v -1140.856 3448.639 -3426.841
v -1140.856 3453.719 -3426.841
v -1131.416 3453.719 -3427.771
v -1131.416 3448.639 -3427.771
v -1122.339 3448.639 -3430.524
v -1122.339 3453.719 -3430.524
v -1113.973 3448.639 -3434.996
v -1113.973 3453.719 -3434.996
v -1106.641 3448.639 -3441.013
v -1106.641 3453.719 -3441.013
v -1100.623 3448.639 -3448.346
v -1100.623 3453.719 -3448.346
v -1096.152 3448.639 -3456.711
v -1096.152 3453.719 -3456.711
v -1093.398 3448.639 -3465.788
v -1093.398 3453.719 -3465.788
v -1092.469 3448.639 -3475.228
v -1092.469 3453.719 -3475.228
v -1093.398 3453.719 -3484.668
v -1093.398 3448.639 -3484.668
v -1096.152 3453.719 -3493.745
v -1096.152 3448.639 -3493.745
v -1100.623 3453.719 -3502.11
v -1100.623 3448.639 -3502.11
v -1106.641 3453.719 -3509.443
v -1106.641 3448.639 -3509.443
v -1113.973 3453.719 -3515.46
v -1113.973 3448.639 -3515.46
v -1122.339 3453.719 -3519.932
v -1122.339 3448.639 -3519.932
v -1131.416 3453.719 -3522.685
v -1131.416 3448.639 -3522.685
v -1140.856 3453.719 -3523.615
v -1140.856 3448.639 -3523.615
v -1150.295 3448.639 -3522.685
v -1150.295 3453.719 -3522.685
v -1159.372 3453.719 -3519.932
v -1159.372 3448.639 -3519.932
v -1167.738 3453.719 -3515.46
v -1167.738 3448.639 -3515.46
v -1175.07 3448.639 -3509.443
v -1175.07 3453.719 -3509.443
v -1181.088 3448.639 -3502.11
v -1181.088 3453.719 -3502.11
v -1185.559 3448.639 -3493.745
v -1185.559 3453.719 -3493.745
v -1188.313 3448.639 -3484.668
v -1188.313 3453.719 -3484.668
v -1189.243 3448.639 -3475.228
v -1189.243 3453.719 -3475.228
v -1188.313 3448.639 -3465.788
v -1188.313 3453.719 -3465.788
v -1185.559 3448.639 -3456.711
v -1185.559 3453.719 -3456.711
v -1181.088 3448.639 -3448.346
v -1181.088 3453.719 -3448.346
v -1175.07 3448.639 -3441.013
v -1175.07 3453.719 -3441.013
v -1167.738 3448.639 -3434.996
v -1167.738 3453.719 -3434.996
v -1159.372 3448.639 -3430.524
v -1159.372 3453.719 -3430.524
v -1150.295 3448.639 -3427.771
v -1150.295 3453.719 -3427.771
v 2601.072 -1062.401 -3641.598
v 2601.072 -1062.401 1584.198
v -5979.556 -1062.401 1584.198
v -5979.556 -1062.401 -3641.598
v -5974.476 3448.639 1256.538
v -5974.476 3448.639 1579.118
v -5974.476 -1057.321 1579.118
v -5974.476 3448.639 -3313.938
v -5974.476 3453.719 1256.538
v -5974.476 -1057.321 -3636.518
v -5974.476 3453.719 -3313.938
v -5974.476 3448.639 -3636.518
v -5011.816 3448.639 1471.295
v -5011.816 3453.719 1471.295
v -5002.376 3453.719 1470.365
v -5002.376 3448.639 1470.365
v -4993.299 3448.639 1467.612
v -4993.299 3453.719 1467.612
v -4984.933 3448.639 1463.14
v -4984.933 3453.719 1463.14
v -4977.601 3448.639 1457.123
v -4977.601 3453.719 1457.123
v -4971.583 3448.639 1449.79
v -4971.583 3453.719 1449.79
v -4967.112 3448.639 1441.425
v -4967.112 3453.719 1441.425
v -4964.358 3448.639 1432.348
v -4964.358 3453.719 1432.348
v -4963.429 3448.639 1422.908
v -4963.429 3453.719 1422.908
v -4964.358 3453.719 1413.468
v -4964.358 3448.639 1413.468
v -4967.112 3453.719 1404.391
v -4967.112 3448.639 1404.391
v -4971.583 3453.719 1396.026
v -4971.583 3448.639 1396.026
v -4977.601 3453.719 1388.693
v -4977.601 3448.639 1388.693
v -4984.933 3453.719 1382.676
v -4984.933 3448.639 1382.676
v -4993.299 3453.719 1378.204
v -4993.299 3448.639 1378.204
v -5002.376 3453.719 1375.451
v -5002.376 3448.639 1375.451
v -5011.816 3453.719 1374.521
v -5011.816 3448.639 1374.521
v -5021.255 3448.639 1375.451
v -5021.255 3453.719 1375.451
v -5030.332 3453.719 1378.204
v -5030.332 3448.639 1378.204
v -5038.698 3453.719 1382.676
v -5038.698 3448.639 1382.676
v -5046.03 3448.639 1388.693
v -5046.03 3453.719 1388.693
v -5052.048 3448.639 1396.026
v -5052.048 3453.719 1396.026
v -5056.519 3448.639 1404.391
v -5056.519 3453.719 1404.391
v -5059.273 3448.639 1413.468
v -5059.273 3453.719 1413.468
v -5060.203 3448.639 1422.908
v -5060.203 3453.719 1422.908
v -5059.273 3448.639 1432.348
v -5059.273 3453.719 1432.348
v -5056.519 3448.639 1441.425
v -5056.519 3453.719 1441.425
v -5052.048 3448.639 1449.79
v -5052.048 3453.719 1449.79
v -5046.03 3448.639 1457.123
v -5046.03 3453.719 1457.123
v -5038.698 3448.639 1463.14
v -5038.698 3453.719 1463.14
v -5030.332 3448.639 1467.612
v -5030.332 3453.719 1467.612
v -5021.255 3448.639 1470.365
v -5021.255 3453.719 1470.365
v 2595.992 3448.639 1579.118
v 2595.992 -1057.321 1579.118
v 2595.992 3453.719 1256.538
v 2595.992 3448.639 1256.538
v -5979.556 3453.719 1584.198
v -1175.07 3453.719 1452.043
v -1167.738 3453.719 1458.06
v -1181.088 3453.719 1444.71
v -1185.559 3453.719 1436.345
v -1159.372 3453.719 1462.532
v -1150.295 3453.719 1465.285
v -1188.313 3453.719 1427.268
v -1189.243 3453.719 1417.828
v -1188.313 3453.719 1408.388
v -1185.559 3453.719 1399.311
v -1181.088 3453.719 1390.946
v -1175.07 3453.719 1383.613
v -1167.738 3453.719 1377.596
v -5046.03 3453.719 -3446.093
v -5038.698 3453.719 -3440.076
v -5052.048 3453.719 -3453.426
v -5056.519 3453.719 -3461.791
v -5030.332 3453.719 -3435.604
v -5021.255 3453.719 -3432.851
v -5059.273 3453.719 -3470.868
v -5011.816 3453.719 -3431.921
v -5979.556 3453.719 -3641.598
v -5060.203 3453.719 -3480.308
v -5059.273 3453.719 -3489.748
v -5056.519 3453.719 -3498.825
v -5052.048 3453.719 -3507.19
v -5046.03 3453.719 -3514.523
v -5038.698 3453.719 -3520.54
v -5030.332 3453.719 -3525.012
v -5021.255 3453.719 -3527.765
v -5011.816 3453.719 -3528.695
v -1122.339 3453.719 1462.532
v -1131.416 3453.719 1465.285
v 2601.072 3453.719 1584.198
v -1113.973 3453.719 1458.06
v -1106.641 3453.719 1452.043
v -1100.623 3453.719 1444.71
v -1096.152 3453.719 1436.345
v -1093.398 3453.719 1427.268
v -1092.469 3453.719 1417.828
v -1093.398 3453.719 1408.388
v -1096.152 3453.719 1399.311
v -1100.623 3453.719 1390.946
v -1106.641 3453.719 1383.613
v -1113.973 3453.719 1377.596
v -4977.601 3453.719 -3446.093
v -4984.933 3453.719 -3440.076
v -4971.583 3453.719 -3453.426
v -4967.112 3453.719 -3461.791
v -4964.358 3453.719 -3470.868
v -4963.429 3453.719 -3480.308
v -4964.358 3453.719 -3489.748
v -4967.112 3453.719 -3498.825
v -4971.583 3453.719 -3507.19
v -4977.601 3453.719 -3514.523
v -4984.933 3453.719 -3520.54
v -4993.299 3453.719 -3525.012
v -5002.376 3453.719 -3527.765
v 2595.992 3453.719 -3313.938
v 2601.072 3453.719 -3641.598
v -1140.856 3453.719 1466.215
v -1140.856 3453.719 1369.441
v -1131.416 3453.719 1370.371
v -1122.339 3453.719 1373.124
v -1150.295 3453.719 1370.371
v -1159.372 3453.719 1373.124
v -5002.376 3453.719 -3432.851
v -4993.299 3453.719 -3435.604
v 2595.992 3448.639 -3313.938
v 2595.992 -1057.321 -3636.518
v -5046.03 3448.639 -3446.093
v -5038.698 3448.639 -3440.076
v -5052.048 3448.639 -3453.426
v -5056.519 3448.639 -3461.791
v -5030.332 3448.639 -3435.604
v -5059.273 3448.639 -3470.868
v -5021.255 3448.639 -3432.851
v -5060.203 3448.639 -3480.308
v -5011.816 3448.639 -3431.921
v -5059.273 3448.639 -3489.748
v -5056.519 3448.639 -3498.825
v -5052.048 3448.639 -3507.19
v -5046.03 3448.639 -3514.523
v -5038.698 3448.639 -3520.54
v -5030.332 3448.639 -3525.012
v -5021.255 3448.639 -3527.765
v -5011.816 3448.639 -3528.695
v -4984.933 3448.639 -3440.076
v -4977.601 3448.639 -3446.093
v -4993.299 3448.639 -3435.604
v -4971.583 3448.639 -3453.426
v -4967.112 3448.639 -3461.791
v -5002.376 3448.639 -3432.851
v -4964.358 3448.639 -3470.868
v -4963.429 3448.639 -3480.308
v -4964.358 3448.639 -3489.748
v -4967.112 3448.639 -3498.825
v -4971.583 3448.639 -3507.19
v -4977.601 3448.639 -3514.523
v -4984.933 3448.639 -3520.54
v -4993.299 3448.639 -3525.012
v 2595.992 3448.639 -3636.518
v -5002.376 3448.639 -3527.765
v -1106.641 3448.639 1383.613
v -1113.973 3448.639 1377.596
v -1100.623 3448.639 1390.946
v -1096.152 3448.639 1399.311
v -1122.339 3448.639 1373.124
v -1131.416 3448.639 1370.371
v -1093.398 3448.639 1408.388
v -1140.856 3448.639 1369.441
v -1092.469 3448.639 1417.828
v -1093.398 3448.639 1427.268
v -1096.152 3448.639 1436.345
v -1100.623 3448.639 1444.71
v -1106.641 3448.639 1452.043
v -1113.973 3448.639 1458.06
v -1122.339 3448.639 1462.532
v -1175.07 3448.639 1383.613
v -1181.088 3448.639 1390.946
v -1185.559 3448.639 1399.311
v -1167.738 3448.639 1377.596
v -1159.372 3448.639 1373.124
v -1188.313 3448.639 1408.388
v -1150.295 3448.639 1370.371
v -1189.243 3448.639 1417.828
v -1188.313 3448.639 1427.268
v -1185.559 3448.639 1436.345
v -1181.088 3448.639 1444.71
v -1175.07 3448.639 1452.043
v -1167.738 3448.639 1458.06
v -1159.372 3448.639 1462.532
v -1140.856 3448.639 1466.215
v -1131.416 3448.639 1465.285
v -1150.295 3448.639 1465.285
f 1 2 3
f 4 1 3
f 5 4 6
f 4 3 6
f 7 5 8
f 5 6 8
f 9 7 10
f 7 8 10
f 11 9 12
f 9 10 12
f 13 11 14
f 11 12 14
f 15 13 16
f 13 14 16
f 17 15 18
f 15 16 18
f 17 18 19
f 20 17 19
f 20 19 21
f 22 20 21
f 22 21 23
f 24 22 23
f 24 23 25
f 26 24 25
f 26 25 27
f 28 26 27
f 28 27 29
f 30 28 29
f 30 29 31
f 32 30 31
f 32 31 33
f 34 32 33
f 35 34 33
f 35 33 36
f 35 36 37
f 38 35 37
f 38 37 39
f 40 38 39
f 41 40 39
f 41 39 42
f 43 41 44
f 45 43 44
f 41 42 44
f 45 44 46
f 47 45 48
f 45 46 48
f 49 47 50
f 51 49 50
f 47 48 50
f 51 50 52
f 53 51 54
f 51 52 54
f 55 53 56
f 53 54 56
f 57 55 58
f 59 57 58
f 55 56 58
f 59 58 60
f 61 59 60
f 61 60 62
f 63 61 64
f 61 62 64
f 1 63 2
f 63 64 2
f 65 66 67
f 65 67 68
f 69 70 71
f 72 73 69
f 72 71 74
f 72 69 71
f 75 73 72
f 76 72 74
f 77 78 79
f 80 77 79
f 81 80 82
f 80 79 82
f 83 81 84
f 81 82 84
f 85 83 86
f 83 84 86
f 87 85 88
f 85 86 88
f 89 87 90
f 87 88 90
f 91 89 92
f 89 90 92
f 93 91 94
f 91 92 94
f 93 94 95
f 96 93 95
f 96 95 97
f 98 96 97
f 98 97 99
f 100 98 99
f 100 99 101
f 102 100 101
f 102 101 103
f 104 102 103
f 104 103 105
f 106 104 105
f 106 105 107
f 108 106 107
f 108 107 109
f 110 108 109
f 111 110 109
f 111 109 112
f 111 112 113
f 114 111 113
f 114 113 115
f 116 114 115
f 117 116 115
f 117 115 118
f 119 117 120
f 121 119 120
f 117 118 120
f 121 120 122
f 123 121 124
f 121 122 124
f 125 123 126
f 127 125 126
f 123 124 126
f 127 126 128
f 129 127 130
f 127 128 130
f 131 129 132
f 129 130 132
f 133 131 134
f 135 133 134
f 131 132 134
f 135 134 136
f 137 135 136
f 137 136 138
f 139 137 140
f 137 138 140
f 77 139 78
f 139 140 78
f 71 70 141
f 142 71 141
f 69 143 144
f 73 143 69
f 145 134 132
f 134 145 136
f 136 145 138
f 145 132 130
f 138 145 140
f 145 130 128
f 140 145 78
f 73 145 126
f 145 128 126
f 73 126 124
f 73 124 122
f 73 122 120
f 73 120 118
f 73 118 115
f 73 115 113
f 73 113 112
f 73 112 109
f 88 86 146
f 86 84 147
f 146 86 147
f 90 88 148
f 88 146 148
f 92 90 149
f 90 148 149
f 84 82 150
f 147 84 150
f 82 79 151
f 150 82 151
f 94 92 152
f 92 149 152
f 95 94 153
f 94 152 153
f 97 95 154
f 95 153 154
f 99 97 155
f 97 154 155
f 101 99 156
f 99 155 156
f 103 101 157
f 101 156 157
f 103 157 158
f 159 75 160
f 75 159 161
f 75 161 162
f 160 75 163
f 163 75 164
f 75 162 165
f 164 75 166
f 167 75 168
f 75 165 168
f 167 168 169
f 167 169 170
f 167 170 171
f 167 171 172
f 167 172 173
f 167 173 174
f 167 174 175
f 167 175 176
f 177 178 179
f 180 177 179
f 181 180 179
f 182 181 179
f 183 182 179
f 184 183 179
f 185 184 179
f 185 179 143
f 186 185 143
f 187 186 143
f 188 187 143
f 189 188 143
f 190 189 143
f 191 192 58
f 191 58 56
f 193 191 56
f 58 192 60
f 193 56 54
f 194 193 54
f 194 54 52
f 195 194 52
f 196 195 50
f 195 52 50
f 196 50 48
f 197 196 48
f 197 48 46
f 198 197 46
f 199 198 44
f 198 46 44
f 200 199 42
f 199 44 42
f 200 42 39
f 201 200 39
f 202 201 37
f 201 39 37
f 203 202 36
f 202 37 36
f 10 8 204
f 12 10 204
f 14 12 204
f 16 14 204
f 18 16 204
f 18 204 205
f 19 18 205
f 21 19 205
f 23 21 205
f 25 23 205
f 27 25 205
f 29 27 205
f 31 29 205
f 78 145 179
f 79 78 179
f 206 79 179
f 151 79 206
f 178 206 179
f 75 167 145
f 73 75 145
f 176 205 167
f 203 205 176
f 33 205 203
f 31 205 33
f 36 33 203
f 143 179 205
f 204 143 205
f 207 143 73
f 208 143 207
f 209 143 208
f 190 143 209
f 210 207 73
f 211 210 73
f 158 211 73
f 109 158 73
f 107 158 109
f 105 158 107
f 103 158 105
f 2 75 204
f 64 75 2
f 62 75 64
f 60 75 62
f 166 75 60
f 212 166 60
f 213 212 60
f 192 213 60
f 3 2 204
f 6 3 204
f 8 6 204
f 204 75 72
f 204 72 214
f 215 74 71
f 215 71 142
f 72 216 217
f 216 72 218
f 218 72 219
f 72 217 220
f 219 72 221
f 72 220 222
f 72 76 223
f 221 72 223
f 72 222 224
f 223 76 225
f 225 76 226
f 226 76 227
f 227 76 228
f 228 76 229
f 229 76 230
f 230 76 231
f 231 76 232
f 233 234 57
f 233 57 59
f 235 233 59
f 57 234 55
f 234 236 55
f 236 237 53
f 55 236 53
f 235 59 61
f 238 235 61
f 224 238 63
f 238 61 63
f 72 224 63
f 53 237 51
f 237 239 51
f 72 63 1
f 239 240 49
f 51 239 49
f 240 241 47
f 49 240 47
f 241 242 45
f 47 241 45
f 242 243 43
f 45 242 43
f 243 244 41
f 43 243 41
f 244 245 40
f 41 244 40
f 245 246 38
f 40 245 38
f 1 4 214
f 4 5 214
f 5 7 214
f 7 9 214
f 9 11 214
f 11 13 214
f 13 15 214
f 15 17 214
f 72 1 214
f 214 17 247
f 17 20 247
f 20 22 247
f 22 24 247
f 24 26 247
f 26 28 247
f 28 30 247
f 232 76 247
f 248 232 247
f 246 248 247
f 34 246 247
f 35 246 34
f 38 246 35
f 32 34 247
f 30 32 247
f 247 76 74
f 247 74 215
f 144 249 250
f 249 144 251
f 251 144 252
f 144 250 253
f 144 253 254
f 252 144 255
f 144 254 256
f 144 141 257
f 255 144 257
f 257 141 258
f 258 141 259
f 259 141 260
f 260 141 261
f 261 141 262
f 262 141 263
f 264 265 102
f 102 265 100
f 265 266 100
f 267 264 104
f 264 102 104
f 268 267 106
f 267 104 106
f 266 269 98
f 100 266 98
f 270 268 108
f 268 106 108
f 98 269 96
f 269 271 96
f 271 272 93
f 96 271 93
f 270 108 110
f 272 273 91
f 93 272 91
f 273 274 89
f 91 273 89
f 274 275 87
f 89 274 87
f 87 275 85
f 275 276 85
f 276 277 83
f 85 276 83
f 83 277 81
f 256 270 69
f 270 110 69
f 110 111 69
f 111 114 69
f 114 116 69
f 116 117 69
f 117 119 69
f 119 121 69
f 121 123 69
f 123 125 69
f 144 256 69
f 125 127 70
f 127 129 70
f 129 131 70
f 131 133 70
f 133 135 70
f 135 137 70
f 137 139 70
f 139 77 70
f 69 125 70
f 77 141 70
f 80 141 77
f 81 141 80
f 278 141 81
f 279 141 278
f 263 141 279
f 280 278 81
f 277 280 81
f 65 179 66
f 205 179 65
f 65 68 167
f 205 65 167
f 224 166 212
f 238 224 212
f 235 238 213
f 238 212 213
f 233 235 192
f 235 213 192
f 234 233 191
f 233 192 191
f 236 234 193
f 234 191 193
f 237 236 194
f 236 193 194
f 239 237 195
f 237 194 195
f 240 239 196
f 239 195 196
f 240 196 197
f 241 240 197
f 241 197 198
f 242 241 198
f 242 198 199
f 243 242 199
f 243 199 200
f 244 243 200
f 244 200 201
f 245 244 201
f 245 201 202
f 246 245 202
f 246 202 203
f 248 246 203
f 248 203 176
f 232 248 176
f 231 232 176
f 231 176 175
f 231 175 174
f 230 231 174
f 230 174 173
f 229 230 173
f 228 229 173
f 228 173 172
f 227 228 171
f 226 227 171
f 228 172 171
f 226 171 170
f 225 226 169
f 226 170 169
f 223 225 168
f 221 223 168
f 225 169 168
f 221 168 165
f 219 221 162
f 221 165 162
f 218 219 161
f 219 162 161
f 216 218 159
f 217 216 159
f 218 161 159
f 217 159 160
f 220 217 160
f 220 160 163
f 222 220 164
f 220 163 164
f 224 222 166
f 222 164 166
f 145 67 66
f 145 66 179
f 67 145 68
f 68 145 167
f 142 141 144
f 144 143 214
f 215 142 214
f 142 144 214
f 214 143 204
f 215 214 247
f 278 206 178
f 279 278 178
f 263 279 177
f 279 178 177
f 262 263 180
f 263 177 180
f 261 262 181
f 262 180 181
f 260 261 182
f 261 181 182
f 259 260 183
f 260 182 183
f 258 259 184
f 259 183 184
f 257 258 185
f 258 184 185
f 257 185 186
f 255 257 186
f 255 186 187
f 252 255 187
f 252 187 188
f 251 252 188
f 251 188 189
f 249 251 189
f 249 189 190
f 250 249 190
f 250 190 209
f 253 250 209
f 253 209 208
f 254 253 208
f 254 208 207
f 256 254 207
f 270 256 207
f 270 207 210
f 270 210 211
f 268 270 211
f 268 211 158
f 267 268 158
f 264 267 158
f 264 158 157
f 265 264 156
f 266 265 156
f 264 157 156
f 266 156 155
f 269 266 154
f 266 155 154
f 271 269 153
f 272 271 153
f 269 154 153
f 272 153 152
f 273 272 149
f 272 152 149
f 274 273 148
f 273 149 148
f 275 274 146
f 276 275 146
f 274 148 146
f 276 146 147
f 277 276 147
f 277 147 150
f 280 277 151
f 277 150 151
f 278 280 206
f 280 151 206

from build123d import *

# Parameters (mm, degrees)
SKETCH1_W           = 2057.4
SKETCH1_H           = 1778
BOSS_EXTRUDE1_DEPTH = 3378.2
SKETCH2_W           = 3374.19999784
SKETCH2_H           = 2053.39999784
CUT_EXTRUDE1_DEPTH  = 1775.99999892
SKETCH3_W           = 3374.19999784
SKETCH3_H           = 2.00000108
BOSS_EXTRUDE2_DEPTH = 127
SKETCH4_W           = 3374.19999784
SKETCH4_H           = 2.00000108
BOSS_EXTRUDE3_DEPTH = 127
CUT_EXTRUDE2_REACH  = 4338.636
SKETCH5_R           = 19.05
SCALE1_SCALE        = 2.54


with BuildPart() as part:
    # Sketch1 → Boss-Extrude1 (new body)
    with BuildSketch(Plane(origin=(0, 0, 0), x_dir=(0, 0, -1), z_dir=(1, 0, 0))):
        with Locations((1028.7, 889)):
            Rectangle(SKETCH1_W, SKETCH1_H)
    extrude(amount=-BOSS_EXTRUDE1_DEPTH)

    # Sketch2 → Cut-Extrude1 (cut)
    with BuildSketch(Plane(origin=(0, 1778, 0), x_dir=(1, 0, 0), z_dir=(0, 1, 0))):
        with Locations((-1689.1, 1028.7)):
            Rectangle(SKETCH2_W, SKETCH2_H)
    extrude(amount=-CUT_EXTRUDE1_DEPTH, mode=Mode.SUBTRACT)

    # Sketch3 → Boss-Extrude2 (add)
    with BuildSketch(Plane.XY.offset(-2055.39999892)):
        with Locations((-1689.1, 1776.99999946)):
            Rectangle(SKETCH3_W, SKETCH3_H)
    extrude(amount=BOSS_EXTRUDE2_DEPTH)

    # Sketch4 → Boss-Extrude3 (add)
    with BuildSketch(Plane(origin=(0, 0, -2.00000108), x_dir=(-1, 0, 0), z_dir=(0, 0, -1))):
        with Locations((1689.1, 1776.99999946)):
            Rectangle(SKETCH4_W, SKETCH4_H)
    extrude(amount=BOSS_EXTRUDE3_DEPTH)

    # Sketch5 → Cut-Extrude2 (cut, up to next)
    with BuildSketch(Plane(origin=(0, 1778, 0), x_dir=(1, 0, 0), z_dir=(0, 1, 0)), mode=Mode.PRIVATE) as cut_extrude2_sk1:
        with Locations(Location((-1473.2, 65.50000108, 0), (0, 0, 270))):
            Circle(SKETCH5_R)
    cut_extrude2_tool1 = extrude(cut_extrude2_sk1.sketch, amount=-CUT_EXTRUDE2_REACH, mode=Mode.PRIVATE) & part.part
    # Sketch5 → Cut-Extrude2 (cut, up to next)
    with BuildSketch(Plane(origin=(0, 1778, 0), x_dir=(1, 0, 0), z_dir=(0, 1, 0)), mode=Mode.PRIVATE) as cut_extrude2_sk2:
        with Locations(Location((-1473.2, 1991.89999892, 0), (0, 0, 270))):
            Circle(SKETCH5_R)
    cut_extrude2_tool2 = extrude(cut_extrude2_sk2.sketch, amount=-CUT_EXTRUDE2_REACH, mode=Mode.PRIVATE) & part.part
    # Sketch5 → Cut-Extrude2 (cut, up to next)
    with BuildSketch(Plane(origin=(0, 1778, 0), x_dir=(1, 0, 0), z_dir=(0, 1, 0)), mode=Mode.PRIVATE) as cut_extrude2_sk3:
        with Locations(Location((-2997.2, 1993.9, 0), (0, 0, 270))):
            Circle(SKETCH5_R)
    cut_extrude2_tool3 = extrude(cut_extrude2_sk3.sketch, amount=-CUT_EXTRUDE2_REACH, mode=Mode.PRIVATE) & part.part
    # Sketch5 → Cut-Extrude2 (cut, up to next)
    with BuildSketch(Plane(origin=(0, 1778, 0), x_dir=(1, 0, 0), z_dir=(0, 1, 0)), mode=Mode.PRIVATE) as cut_extrude2_sk4:
        with Locations(Location((-2997.2, 63.5, 0), (0, 0, 270))):
            Circle(SKETCH5_R)
    cut_extrude2_tool4 = extrude(cut_extrude2_sk4.sketch, amount=-CUT_EXTRUDE2_REACH, mode=Mode.PRIVATE) & part.part
    add(cut_extrude2_tool1.solids().sort_by_distance((-1473.2, 1778, -65.500001))[0], mode=Mode.SUBTRACT)
    add(cut_extrude2_tool2.solids().sort_by_distance((-1473.2, 1778, -1991.899999))[0], mode=Mode.SUBTRACT)
    add(cut_extrude2_tool3.solids().sort_by_distance((-2997.2, 1778, -1993.9))[0], mode=Mode.SUBTRACT)
    add(cut_extrude2_tool4.solids().sort_by_distance((-2997.2, 1778, -63.5))[0], mode=Mode.SUBTRACT)


with BuildPart() as part_1:
    # Scale1: scaled about (-1689.008088594, 689.870781671, -1028.7)
    add(part.part.scale(SCALE1_SCALE).moved(Location((2601.072456435, -1062.401003773, 1584.198))))


solid = part_1.part
